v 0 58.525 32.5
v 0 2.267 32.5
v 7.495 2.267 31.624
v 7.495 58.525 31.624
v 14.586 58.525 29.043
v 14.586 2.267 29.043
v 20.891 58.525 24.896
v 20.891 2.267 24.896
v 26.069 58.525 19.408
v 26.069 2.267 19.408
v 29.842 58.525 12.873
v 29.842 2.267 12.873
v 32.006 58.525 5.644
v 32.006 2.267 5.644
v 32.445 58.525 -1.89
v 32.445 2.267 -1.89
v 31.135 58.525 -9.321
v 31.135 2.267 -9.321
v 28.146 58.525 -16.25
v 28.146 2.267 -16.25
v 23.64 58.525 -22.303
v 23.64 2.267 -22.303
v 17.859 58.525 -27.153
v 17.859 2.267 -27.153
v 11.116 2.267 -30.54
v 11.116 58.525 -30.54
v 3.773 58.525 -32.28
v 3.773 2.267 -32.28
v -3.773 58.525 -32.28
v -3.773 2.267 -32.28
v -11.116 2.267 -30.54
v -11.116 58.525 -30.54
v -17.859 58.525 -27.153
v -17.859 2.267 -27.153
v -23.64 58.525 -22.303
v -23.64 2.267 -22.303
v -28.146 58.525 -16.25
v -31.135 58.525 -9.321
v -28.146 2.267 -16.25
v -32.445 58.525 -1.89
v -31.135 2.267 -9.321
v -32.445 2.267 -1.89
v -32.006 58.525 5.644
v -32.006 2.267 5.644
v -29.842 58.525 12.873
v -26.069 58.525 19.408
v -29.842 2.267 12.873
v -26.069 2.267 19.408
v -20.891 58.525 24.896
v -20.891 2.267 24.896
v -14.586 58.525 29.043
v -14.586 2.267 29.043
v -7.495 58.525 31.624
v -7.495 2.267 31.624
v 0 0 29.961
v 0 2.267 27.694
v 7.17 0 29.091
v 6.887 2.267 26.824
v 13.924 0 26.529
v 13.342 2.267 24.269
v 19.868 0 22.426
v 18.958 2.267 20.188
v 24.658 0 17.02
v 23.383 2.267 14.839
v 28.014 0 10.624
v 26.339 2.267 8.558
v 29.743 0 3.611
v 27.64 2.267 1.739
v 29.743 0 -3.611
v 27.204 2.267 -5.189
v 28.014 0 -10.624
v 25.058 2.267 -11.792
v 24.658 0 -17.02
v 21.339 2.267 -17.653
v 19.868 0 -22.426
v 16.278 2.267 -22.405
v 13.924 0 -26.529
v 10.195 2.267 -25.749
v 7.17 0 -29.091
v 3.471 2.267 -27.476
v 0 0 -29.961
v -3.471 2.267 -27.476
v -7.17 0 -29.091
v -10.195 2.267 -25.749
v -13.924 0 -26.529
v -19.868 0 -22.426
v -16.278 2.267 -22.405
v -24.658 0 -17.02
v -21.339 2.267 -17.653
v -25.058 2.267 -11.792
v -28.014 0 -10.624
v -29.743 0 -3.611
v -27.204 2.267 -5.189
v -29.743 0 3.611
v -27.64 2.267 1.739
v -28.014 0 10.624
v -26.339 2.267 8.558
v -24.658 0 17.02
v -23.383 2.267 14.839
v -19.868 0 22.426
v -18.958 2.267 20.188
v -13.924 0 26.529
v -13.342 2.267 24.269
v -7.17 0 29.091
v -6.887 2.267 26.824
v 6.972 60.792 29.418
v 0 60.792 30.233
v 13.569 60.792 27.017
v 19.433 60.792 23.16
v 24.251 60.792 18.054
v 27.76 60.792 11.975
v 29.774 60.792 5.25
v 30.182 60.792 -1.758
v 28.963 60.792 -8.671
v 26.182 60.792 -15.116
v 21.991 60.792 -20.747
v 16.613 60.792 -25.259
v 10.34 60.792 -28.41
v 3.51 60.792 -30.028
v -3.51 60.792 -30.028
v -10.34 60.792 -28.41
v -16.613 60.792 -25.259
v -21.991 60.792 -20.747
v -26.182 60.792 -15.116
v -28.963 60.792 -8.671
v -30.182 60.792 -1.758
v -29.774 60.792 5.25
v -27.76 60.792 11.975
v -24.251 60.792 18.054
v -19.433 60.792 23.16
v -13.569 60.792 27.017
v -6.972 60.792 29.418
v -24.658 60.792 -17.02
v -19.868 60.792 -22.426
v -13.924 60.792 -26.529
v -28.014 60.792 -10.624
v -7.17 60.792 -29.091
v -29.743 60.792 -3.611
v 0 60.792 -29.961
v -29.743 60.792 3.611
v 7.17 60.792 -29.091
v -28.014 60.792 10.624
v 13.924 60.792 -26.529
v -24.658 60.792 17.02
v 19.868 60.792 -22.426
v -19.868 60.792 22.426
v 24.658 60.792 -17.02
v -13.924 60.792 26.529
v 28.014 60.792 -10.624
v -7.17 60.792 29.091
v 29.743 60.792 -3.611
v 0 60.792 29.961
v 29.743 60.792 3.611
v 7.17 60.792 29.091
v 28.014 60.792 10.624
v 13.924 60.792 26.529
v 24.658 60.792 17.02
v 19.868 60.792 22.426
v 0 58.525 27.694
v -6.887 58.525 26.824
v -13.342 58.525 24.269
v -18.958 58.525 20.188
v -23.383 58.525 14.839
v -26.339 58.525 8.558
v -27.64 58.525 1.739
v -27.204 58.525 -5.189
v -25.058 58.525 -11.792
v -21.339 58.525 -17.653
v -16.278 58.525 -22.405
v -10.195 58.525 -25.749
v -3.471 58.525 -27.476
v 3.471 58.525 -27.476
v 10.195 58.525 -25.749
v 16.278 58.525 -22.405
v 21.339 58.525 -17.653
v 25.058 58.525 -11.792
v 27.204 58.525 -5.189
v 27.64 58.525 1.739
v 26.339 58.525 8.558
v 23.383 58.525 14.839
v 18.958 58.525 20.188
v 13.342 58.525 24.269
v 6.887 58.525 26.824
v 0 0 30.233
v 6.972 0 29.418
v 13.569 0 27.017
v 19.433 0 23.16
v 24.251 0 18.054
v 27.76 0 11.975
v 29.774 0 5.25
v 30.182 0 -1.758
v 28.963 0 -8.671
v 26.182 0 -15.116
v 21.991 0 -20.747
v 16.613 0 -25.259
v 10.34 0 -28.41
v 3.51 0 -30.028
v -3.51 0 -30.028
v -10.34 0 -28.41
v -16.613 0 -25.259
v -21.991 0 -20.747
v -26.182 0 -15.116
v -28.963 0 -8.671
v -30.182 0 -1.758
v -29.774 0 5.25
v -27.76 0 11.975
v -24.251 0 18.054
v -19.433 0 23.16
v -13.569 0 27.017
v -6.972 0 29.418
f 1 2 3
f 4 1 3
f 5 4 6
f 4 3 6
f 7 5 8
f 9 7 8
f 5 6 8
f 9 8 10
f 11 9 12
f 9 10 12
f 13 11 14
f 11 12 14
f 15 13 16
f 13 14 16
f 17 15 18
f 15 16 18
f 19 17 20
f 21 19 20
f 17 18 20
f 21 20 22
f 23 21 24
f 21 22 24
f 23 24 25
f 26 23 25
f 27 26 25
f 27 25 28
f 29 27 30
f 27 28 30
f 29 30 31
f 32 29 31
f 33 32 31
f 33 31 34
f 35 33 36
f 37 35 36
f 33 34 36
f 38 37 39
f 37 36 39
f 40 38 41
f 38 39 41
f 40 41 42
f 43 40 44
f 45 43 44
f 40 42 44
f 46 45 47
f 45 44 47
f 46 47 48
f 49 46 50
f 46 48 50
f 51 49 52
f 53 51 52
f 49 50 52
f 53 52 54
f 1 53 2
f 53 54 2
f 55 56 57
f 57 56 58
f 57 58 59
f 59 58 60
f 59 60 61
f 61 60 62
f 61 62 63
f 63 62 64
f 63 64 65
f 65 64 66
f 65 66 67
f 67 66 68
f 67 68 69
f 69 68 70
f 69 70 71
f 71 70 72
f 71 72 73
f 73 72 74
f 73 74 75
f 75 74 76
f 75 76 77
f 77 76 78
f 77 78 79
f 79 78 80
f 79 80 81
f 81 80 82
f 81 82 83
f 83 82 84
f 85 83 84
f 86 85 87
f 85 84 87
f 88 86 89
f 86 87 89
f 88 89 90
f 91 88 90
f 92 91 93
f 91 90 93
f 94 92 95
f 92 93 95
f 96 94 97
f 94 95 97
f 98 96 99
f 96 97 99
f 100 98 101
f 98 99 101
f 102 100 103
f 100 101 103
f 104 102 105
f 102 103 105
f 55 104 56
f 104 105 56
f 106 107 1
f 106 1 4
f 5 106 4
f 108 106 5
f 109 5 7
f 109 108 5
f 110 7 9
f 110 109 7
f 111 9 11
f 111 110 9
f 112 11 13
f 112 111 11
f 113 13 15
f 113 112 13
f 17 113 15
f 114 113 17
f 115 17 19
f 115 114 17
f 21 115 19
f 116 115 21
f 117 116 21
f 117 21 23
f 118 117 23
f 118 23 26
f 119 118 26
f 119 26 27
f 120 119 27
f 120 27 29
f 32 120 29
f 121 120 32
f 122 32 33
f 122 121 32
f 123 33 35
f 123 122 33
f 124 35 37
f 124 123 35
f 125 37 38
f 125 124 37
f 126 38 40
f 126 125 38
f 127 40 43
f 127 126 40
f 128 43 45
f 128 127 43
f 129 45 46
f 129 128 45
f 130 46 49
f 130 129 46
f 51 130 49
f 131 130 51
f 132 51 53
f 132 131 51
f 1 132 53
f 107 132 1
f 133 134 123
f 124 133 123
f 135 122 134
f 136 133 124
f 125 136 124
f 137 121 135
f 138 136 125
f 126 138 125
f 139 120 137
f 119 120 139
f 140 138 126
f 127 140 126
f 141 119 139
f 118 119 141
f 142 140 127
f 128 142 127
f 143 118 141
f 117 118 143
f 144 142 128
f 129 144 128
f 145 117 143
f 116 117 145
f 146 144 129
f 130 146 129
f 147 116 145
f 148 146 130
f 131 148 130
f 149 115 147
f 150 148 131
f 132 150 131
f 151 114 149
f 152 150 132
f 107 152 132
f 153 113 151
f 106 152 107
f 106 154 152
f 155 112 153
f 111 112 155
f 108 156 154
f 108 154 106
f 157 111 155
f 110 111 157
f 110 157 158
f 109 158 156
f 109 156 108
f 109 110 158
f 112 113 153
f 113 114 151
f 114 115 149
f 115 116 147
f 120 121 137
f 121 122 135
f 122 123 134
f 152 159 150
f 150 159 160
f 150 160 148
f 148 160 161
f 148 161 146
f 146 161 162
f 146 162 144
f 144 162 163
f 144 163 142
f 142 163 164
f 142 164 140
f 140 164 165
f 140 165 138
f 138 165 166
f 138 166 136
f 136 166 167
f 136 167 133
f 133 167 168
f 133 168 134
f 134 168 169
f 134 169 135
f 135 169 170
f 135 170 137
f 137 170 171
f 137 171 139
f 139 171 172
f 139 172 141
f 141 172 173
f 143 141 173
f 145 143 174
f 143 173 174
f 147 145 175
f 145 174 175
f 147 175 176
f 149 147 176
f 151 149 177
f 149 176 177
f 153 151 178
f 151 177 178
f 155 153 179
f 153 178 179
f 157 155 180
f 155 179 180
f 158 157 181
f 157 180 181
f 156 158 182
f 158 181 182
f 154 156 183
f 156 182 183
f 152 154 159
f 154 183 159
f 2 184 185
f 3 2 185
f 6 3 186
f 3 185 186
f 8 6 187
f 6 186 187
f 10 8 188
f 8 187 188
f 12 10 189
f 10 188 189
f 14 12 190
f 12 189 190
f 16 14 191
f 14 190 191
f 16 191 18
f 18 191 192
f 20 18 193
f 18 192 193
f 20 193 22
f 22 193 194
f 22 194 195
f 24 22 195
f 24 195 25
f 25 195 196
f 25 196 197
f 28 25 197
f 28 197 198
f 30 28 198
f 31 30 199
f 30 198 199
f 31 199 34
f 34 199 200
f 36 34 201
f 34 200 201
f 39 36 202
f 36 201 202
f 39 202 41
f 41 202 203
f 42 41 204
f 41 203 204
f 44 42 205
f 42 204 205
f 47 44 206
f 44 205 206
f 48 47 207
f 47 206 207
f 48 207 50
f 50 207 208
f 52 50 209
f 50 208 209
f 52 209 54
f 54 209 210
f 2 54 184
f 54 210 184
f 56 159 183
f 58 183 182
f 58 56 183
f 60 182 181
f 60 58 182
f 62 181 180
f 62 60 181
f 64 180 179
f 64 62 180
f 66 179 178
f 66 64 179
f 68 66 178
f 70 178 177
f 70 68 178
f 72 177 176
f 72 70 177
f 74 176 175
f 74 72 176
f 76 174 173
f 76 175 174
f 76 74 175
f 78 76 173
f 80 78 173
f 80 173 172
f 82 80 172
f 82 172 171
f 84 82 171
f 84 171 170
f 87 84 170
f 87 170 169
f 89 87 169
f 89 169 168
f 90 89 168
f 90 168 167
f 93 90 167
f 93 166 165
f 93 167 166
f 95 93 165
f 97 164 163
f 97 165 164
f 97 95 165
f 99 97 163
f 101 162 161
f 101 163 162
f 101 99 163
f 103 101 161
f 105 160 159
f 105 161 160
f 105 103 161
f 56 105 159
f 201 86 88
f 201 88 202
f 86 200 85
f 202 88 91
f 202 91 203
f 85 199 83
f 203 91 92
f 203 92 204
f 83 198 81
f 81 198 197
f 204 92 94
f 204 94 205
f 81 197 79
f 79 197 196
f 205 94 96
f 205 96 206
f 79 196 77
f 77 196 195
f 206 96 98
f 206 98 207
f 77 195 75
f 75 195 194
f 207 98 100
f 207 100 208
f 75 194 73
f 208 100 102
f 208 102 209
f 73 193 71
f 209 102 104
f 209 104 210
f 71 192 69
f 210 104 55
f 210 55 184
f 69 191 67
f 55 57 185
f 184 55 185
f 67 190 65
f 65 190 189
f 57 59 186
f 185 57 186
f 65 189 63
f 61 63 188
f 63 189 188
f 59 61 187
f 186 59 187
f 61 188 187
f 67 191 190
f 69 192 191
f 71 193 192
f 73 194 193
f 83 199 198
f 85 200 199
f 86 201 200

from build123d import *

# Parameters (mm, degrees)
SKETCH1_R           = 32.5
BOSS_EXTRUDE1_DEPTH = 60.791801945
SKETCH2_R           = 27.69421809
CUT_EXTRUDE1_DEPTH  = 77.211174927
CHAMFER1_SIZE       = 2.267081835


with BuildPart() as part:
    # Sketch1 → Boss-Extrude1 (new body)
    with BuildSketch(Plane(origin=(0, 0, 0), x_dir=(1, 0, 0), z_dir=(0, 1, 0))):
        Circle(SKETCH1_R)
    extrude(amount=BOSS_EXTRUDE1_DEPTH)

    # Sketch2 → Cut-Extrude1 (cut, through all)
    with BuildSketch(Plane(origin=(0, 0, 0), x_dir=(1, 0, 0), z_dir=(0, 1, 0))):
        Circle(SKETCH2_R)
    extrude(amount=CUT_EXTRUDE1_DEPTH, mode=Mode.SUBTRACT)

    # Chamfer1
    chamfer1_edges = [part.edges().sort_by_distance(p)[0] for p in [
        (-27.69421809, 60.791801945, 0),
        (-27.69421809, 0, 0),
        (-32.5, 0, 0),
        (-32.5, 60.791801945, 0),
    ]]
    chamfer(chamfer1_edges, length=CHAMFER1_SIZE)


solid = part.part
